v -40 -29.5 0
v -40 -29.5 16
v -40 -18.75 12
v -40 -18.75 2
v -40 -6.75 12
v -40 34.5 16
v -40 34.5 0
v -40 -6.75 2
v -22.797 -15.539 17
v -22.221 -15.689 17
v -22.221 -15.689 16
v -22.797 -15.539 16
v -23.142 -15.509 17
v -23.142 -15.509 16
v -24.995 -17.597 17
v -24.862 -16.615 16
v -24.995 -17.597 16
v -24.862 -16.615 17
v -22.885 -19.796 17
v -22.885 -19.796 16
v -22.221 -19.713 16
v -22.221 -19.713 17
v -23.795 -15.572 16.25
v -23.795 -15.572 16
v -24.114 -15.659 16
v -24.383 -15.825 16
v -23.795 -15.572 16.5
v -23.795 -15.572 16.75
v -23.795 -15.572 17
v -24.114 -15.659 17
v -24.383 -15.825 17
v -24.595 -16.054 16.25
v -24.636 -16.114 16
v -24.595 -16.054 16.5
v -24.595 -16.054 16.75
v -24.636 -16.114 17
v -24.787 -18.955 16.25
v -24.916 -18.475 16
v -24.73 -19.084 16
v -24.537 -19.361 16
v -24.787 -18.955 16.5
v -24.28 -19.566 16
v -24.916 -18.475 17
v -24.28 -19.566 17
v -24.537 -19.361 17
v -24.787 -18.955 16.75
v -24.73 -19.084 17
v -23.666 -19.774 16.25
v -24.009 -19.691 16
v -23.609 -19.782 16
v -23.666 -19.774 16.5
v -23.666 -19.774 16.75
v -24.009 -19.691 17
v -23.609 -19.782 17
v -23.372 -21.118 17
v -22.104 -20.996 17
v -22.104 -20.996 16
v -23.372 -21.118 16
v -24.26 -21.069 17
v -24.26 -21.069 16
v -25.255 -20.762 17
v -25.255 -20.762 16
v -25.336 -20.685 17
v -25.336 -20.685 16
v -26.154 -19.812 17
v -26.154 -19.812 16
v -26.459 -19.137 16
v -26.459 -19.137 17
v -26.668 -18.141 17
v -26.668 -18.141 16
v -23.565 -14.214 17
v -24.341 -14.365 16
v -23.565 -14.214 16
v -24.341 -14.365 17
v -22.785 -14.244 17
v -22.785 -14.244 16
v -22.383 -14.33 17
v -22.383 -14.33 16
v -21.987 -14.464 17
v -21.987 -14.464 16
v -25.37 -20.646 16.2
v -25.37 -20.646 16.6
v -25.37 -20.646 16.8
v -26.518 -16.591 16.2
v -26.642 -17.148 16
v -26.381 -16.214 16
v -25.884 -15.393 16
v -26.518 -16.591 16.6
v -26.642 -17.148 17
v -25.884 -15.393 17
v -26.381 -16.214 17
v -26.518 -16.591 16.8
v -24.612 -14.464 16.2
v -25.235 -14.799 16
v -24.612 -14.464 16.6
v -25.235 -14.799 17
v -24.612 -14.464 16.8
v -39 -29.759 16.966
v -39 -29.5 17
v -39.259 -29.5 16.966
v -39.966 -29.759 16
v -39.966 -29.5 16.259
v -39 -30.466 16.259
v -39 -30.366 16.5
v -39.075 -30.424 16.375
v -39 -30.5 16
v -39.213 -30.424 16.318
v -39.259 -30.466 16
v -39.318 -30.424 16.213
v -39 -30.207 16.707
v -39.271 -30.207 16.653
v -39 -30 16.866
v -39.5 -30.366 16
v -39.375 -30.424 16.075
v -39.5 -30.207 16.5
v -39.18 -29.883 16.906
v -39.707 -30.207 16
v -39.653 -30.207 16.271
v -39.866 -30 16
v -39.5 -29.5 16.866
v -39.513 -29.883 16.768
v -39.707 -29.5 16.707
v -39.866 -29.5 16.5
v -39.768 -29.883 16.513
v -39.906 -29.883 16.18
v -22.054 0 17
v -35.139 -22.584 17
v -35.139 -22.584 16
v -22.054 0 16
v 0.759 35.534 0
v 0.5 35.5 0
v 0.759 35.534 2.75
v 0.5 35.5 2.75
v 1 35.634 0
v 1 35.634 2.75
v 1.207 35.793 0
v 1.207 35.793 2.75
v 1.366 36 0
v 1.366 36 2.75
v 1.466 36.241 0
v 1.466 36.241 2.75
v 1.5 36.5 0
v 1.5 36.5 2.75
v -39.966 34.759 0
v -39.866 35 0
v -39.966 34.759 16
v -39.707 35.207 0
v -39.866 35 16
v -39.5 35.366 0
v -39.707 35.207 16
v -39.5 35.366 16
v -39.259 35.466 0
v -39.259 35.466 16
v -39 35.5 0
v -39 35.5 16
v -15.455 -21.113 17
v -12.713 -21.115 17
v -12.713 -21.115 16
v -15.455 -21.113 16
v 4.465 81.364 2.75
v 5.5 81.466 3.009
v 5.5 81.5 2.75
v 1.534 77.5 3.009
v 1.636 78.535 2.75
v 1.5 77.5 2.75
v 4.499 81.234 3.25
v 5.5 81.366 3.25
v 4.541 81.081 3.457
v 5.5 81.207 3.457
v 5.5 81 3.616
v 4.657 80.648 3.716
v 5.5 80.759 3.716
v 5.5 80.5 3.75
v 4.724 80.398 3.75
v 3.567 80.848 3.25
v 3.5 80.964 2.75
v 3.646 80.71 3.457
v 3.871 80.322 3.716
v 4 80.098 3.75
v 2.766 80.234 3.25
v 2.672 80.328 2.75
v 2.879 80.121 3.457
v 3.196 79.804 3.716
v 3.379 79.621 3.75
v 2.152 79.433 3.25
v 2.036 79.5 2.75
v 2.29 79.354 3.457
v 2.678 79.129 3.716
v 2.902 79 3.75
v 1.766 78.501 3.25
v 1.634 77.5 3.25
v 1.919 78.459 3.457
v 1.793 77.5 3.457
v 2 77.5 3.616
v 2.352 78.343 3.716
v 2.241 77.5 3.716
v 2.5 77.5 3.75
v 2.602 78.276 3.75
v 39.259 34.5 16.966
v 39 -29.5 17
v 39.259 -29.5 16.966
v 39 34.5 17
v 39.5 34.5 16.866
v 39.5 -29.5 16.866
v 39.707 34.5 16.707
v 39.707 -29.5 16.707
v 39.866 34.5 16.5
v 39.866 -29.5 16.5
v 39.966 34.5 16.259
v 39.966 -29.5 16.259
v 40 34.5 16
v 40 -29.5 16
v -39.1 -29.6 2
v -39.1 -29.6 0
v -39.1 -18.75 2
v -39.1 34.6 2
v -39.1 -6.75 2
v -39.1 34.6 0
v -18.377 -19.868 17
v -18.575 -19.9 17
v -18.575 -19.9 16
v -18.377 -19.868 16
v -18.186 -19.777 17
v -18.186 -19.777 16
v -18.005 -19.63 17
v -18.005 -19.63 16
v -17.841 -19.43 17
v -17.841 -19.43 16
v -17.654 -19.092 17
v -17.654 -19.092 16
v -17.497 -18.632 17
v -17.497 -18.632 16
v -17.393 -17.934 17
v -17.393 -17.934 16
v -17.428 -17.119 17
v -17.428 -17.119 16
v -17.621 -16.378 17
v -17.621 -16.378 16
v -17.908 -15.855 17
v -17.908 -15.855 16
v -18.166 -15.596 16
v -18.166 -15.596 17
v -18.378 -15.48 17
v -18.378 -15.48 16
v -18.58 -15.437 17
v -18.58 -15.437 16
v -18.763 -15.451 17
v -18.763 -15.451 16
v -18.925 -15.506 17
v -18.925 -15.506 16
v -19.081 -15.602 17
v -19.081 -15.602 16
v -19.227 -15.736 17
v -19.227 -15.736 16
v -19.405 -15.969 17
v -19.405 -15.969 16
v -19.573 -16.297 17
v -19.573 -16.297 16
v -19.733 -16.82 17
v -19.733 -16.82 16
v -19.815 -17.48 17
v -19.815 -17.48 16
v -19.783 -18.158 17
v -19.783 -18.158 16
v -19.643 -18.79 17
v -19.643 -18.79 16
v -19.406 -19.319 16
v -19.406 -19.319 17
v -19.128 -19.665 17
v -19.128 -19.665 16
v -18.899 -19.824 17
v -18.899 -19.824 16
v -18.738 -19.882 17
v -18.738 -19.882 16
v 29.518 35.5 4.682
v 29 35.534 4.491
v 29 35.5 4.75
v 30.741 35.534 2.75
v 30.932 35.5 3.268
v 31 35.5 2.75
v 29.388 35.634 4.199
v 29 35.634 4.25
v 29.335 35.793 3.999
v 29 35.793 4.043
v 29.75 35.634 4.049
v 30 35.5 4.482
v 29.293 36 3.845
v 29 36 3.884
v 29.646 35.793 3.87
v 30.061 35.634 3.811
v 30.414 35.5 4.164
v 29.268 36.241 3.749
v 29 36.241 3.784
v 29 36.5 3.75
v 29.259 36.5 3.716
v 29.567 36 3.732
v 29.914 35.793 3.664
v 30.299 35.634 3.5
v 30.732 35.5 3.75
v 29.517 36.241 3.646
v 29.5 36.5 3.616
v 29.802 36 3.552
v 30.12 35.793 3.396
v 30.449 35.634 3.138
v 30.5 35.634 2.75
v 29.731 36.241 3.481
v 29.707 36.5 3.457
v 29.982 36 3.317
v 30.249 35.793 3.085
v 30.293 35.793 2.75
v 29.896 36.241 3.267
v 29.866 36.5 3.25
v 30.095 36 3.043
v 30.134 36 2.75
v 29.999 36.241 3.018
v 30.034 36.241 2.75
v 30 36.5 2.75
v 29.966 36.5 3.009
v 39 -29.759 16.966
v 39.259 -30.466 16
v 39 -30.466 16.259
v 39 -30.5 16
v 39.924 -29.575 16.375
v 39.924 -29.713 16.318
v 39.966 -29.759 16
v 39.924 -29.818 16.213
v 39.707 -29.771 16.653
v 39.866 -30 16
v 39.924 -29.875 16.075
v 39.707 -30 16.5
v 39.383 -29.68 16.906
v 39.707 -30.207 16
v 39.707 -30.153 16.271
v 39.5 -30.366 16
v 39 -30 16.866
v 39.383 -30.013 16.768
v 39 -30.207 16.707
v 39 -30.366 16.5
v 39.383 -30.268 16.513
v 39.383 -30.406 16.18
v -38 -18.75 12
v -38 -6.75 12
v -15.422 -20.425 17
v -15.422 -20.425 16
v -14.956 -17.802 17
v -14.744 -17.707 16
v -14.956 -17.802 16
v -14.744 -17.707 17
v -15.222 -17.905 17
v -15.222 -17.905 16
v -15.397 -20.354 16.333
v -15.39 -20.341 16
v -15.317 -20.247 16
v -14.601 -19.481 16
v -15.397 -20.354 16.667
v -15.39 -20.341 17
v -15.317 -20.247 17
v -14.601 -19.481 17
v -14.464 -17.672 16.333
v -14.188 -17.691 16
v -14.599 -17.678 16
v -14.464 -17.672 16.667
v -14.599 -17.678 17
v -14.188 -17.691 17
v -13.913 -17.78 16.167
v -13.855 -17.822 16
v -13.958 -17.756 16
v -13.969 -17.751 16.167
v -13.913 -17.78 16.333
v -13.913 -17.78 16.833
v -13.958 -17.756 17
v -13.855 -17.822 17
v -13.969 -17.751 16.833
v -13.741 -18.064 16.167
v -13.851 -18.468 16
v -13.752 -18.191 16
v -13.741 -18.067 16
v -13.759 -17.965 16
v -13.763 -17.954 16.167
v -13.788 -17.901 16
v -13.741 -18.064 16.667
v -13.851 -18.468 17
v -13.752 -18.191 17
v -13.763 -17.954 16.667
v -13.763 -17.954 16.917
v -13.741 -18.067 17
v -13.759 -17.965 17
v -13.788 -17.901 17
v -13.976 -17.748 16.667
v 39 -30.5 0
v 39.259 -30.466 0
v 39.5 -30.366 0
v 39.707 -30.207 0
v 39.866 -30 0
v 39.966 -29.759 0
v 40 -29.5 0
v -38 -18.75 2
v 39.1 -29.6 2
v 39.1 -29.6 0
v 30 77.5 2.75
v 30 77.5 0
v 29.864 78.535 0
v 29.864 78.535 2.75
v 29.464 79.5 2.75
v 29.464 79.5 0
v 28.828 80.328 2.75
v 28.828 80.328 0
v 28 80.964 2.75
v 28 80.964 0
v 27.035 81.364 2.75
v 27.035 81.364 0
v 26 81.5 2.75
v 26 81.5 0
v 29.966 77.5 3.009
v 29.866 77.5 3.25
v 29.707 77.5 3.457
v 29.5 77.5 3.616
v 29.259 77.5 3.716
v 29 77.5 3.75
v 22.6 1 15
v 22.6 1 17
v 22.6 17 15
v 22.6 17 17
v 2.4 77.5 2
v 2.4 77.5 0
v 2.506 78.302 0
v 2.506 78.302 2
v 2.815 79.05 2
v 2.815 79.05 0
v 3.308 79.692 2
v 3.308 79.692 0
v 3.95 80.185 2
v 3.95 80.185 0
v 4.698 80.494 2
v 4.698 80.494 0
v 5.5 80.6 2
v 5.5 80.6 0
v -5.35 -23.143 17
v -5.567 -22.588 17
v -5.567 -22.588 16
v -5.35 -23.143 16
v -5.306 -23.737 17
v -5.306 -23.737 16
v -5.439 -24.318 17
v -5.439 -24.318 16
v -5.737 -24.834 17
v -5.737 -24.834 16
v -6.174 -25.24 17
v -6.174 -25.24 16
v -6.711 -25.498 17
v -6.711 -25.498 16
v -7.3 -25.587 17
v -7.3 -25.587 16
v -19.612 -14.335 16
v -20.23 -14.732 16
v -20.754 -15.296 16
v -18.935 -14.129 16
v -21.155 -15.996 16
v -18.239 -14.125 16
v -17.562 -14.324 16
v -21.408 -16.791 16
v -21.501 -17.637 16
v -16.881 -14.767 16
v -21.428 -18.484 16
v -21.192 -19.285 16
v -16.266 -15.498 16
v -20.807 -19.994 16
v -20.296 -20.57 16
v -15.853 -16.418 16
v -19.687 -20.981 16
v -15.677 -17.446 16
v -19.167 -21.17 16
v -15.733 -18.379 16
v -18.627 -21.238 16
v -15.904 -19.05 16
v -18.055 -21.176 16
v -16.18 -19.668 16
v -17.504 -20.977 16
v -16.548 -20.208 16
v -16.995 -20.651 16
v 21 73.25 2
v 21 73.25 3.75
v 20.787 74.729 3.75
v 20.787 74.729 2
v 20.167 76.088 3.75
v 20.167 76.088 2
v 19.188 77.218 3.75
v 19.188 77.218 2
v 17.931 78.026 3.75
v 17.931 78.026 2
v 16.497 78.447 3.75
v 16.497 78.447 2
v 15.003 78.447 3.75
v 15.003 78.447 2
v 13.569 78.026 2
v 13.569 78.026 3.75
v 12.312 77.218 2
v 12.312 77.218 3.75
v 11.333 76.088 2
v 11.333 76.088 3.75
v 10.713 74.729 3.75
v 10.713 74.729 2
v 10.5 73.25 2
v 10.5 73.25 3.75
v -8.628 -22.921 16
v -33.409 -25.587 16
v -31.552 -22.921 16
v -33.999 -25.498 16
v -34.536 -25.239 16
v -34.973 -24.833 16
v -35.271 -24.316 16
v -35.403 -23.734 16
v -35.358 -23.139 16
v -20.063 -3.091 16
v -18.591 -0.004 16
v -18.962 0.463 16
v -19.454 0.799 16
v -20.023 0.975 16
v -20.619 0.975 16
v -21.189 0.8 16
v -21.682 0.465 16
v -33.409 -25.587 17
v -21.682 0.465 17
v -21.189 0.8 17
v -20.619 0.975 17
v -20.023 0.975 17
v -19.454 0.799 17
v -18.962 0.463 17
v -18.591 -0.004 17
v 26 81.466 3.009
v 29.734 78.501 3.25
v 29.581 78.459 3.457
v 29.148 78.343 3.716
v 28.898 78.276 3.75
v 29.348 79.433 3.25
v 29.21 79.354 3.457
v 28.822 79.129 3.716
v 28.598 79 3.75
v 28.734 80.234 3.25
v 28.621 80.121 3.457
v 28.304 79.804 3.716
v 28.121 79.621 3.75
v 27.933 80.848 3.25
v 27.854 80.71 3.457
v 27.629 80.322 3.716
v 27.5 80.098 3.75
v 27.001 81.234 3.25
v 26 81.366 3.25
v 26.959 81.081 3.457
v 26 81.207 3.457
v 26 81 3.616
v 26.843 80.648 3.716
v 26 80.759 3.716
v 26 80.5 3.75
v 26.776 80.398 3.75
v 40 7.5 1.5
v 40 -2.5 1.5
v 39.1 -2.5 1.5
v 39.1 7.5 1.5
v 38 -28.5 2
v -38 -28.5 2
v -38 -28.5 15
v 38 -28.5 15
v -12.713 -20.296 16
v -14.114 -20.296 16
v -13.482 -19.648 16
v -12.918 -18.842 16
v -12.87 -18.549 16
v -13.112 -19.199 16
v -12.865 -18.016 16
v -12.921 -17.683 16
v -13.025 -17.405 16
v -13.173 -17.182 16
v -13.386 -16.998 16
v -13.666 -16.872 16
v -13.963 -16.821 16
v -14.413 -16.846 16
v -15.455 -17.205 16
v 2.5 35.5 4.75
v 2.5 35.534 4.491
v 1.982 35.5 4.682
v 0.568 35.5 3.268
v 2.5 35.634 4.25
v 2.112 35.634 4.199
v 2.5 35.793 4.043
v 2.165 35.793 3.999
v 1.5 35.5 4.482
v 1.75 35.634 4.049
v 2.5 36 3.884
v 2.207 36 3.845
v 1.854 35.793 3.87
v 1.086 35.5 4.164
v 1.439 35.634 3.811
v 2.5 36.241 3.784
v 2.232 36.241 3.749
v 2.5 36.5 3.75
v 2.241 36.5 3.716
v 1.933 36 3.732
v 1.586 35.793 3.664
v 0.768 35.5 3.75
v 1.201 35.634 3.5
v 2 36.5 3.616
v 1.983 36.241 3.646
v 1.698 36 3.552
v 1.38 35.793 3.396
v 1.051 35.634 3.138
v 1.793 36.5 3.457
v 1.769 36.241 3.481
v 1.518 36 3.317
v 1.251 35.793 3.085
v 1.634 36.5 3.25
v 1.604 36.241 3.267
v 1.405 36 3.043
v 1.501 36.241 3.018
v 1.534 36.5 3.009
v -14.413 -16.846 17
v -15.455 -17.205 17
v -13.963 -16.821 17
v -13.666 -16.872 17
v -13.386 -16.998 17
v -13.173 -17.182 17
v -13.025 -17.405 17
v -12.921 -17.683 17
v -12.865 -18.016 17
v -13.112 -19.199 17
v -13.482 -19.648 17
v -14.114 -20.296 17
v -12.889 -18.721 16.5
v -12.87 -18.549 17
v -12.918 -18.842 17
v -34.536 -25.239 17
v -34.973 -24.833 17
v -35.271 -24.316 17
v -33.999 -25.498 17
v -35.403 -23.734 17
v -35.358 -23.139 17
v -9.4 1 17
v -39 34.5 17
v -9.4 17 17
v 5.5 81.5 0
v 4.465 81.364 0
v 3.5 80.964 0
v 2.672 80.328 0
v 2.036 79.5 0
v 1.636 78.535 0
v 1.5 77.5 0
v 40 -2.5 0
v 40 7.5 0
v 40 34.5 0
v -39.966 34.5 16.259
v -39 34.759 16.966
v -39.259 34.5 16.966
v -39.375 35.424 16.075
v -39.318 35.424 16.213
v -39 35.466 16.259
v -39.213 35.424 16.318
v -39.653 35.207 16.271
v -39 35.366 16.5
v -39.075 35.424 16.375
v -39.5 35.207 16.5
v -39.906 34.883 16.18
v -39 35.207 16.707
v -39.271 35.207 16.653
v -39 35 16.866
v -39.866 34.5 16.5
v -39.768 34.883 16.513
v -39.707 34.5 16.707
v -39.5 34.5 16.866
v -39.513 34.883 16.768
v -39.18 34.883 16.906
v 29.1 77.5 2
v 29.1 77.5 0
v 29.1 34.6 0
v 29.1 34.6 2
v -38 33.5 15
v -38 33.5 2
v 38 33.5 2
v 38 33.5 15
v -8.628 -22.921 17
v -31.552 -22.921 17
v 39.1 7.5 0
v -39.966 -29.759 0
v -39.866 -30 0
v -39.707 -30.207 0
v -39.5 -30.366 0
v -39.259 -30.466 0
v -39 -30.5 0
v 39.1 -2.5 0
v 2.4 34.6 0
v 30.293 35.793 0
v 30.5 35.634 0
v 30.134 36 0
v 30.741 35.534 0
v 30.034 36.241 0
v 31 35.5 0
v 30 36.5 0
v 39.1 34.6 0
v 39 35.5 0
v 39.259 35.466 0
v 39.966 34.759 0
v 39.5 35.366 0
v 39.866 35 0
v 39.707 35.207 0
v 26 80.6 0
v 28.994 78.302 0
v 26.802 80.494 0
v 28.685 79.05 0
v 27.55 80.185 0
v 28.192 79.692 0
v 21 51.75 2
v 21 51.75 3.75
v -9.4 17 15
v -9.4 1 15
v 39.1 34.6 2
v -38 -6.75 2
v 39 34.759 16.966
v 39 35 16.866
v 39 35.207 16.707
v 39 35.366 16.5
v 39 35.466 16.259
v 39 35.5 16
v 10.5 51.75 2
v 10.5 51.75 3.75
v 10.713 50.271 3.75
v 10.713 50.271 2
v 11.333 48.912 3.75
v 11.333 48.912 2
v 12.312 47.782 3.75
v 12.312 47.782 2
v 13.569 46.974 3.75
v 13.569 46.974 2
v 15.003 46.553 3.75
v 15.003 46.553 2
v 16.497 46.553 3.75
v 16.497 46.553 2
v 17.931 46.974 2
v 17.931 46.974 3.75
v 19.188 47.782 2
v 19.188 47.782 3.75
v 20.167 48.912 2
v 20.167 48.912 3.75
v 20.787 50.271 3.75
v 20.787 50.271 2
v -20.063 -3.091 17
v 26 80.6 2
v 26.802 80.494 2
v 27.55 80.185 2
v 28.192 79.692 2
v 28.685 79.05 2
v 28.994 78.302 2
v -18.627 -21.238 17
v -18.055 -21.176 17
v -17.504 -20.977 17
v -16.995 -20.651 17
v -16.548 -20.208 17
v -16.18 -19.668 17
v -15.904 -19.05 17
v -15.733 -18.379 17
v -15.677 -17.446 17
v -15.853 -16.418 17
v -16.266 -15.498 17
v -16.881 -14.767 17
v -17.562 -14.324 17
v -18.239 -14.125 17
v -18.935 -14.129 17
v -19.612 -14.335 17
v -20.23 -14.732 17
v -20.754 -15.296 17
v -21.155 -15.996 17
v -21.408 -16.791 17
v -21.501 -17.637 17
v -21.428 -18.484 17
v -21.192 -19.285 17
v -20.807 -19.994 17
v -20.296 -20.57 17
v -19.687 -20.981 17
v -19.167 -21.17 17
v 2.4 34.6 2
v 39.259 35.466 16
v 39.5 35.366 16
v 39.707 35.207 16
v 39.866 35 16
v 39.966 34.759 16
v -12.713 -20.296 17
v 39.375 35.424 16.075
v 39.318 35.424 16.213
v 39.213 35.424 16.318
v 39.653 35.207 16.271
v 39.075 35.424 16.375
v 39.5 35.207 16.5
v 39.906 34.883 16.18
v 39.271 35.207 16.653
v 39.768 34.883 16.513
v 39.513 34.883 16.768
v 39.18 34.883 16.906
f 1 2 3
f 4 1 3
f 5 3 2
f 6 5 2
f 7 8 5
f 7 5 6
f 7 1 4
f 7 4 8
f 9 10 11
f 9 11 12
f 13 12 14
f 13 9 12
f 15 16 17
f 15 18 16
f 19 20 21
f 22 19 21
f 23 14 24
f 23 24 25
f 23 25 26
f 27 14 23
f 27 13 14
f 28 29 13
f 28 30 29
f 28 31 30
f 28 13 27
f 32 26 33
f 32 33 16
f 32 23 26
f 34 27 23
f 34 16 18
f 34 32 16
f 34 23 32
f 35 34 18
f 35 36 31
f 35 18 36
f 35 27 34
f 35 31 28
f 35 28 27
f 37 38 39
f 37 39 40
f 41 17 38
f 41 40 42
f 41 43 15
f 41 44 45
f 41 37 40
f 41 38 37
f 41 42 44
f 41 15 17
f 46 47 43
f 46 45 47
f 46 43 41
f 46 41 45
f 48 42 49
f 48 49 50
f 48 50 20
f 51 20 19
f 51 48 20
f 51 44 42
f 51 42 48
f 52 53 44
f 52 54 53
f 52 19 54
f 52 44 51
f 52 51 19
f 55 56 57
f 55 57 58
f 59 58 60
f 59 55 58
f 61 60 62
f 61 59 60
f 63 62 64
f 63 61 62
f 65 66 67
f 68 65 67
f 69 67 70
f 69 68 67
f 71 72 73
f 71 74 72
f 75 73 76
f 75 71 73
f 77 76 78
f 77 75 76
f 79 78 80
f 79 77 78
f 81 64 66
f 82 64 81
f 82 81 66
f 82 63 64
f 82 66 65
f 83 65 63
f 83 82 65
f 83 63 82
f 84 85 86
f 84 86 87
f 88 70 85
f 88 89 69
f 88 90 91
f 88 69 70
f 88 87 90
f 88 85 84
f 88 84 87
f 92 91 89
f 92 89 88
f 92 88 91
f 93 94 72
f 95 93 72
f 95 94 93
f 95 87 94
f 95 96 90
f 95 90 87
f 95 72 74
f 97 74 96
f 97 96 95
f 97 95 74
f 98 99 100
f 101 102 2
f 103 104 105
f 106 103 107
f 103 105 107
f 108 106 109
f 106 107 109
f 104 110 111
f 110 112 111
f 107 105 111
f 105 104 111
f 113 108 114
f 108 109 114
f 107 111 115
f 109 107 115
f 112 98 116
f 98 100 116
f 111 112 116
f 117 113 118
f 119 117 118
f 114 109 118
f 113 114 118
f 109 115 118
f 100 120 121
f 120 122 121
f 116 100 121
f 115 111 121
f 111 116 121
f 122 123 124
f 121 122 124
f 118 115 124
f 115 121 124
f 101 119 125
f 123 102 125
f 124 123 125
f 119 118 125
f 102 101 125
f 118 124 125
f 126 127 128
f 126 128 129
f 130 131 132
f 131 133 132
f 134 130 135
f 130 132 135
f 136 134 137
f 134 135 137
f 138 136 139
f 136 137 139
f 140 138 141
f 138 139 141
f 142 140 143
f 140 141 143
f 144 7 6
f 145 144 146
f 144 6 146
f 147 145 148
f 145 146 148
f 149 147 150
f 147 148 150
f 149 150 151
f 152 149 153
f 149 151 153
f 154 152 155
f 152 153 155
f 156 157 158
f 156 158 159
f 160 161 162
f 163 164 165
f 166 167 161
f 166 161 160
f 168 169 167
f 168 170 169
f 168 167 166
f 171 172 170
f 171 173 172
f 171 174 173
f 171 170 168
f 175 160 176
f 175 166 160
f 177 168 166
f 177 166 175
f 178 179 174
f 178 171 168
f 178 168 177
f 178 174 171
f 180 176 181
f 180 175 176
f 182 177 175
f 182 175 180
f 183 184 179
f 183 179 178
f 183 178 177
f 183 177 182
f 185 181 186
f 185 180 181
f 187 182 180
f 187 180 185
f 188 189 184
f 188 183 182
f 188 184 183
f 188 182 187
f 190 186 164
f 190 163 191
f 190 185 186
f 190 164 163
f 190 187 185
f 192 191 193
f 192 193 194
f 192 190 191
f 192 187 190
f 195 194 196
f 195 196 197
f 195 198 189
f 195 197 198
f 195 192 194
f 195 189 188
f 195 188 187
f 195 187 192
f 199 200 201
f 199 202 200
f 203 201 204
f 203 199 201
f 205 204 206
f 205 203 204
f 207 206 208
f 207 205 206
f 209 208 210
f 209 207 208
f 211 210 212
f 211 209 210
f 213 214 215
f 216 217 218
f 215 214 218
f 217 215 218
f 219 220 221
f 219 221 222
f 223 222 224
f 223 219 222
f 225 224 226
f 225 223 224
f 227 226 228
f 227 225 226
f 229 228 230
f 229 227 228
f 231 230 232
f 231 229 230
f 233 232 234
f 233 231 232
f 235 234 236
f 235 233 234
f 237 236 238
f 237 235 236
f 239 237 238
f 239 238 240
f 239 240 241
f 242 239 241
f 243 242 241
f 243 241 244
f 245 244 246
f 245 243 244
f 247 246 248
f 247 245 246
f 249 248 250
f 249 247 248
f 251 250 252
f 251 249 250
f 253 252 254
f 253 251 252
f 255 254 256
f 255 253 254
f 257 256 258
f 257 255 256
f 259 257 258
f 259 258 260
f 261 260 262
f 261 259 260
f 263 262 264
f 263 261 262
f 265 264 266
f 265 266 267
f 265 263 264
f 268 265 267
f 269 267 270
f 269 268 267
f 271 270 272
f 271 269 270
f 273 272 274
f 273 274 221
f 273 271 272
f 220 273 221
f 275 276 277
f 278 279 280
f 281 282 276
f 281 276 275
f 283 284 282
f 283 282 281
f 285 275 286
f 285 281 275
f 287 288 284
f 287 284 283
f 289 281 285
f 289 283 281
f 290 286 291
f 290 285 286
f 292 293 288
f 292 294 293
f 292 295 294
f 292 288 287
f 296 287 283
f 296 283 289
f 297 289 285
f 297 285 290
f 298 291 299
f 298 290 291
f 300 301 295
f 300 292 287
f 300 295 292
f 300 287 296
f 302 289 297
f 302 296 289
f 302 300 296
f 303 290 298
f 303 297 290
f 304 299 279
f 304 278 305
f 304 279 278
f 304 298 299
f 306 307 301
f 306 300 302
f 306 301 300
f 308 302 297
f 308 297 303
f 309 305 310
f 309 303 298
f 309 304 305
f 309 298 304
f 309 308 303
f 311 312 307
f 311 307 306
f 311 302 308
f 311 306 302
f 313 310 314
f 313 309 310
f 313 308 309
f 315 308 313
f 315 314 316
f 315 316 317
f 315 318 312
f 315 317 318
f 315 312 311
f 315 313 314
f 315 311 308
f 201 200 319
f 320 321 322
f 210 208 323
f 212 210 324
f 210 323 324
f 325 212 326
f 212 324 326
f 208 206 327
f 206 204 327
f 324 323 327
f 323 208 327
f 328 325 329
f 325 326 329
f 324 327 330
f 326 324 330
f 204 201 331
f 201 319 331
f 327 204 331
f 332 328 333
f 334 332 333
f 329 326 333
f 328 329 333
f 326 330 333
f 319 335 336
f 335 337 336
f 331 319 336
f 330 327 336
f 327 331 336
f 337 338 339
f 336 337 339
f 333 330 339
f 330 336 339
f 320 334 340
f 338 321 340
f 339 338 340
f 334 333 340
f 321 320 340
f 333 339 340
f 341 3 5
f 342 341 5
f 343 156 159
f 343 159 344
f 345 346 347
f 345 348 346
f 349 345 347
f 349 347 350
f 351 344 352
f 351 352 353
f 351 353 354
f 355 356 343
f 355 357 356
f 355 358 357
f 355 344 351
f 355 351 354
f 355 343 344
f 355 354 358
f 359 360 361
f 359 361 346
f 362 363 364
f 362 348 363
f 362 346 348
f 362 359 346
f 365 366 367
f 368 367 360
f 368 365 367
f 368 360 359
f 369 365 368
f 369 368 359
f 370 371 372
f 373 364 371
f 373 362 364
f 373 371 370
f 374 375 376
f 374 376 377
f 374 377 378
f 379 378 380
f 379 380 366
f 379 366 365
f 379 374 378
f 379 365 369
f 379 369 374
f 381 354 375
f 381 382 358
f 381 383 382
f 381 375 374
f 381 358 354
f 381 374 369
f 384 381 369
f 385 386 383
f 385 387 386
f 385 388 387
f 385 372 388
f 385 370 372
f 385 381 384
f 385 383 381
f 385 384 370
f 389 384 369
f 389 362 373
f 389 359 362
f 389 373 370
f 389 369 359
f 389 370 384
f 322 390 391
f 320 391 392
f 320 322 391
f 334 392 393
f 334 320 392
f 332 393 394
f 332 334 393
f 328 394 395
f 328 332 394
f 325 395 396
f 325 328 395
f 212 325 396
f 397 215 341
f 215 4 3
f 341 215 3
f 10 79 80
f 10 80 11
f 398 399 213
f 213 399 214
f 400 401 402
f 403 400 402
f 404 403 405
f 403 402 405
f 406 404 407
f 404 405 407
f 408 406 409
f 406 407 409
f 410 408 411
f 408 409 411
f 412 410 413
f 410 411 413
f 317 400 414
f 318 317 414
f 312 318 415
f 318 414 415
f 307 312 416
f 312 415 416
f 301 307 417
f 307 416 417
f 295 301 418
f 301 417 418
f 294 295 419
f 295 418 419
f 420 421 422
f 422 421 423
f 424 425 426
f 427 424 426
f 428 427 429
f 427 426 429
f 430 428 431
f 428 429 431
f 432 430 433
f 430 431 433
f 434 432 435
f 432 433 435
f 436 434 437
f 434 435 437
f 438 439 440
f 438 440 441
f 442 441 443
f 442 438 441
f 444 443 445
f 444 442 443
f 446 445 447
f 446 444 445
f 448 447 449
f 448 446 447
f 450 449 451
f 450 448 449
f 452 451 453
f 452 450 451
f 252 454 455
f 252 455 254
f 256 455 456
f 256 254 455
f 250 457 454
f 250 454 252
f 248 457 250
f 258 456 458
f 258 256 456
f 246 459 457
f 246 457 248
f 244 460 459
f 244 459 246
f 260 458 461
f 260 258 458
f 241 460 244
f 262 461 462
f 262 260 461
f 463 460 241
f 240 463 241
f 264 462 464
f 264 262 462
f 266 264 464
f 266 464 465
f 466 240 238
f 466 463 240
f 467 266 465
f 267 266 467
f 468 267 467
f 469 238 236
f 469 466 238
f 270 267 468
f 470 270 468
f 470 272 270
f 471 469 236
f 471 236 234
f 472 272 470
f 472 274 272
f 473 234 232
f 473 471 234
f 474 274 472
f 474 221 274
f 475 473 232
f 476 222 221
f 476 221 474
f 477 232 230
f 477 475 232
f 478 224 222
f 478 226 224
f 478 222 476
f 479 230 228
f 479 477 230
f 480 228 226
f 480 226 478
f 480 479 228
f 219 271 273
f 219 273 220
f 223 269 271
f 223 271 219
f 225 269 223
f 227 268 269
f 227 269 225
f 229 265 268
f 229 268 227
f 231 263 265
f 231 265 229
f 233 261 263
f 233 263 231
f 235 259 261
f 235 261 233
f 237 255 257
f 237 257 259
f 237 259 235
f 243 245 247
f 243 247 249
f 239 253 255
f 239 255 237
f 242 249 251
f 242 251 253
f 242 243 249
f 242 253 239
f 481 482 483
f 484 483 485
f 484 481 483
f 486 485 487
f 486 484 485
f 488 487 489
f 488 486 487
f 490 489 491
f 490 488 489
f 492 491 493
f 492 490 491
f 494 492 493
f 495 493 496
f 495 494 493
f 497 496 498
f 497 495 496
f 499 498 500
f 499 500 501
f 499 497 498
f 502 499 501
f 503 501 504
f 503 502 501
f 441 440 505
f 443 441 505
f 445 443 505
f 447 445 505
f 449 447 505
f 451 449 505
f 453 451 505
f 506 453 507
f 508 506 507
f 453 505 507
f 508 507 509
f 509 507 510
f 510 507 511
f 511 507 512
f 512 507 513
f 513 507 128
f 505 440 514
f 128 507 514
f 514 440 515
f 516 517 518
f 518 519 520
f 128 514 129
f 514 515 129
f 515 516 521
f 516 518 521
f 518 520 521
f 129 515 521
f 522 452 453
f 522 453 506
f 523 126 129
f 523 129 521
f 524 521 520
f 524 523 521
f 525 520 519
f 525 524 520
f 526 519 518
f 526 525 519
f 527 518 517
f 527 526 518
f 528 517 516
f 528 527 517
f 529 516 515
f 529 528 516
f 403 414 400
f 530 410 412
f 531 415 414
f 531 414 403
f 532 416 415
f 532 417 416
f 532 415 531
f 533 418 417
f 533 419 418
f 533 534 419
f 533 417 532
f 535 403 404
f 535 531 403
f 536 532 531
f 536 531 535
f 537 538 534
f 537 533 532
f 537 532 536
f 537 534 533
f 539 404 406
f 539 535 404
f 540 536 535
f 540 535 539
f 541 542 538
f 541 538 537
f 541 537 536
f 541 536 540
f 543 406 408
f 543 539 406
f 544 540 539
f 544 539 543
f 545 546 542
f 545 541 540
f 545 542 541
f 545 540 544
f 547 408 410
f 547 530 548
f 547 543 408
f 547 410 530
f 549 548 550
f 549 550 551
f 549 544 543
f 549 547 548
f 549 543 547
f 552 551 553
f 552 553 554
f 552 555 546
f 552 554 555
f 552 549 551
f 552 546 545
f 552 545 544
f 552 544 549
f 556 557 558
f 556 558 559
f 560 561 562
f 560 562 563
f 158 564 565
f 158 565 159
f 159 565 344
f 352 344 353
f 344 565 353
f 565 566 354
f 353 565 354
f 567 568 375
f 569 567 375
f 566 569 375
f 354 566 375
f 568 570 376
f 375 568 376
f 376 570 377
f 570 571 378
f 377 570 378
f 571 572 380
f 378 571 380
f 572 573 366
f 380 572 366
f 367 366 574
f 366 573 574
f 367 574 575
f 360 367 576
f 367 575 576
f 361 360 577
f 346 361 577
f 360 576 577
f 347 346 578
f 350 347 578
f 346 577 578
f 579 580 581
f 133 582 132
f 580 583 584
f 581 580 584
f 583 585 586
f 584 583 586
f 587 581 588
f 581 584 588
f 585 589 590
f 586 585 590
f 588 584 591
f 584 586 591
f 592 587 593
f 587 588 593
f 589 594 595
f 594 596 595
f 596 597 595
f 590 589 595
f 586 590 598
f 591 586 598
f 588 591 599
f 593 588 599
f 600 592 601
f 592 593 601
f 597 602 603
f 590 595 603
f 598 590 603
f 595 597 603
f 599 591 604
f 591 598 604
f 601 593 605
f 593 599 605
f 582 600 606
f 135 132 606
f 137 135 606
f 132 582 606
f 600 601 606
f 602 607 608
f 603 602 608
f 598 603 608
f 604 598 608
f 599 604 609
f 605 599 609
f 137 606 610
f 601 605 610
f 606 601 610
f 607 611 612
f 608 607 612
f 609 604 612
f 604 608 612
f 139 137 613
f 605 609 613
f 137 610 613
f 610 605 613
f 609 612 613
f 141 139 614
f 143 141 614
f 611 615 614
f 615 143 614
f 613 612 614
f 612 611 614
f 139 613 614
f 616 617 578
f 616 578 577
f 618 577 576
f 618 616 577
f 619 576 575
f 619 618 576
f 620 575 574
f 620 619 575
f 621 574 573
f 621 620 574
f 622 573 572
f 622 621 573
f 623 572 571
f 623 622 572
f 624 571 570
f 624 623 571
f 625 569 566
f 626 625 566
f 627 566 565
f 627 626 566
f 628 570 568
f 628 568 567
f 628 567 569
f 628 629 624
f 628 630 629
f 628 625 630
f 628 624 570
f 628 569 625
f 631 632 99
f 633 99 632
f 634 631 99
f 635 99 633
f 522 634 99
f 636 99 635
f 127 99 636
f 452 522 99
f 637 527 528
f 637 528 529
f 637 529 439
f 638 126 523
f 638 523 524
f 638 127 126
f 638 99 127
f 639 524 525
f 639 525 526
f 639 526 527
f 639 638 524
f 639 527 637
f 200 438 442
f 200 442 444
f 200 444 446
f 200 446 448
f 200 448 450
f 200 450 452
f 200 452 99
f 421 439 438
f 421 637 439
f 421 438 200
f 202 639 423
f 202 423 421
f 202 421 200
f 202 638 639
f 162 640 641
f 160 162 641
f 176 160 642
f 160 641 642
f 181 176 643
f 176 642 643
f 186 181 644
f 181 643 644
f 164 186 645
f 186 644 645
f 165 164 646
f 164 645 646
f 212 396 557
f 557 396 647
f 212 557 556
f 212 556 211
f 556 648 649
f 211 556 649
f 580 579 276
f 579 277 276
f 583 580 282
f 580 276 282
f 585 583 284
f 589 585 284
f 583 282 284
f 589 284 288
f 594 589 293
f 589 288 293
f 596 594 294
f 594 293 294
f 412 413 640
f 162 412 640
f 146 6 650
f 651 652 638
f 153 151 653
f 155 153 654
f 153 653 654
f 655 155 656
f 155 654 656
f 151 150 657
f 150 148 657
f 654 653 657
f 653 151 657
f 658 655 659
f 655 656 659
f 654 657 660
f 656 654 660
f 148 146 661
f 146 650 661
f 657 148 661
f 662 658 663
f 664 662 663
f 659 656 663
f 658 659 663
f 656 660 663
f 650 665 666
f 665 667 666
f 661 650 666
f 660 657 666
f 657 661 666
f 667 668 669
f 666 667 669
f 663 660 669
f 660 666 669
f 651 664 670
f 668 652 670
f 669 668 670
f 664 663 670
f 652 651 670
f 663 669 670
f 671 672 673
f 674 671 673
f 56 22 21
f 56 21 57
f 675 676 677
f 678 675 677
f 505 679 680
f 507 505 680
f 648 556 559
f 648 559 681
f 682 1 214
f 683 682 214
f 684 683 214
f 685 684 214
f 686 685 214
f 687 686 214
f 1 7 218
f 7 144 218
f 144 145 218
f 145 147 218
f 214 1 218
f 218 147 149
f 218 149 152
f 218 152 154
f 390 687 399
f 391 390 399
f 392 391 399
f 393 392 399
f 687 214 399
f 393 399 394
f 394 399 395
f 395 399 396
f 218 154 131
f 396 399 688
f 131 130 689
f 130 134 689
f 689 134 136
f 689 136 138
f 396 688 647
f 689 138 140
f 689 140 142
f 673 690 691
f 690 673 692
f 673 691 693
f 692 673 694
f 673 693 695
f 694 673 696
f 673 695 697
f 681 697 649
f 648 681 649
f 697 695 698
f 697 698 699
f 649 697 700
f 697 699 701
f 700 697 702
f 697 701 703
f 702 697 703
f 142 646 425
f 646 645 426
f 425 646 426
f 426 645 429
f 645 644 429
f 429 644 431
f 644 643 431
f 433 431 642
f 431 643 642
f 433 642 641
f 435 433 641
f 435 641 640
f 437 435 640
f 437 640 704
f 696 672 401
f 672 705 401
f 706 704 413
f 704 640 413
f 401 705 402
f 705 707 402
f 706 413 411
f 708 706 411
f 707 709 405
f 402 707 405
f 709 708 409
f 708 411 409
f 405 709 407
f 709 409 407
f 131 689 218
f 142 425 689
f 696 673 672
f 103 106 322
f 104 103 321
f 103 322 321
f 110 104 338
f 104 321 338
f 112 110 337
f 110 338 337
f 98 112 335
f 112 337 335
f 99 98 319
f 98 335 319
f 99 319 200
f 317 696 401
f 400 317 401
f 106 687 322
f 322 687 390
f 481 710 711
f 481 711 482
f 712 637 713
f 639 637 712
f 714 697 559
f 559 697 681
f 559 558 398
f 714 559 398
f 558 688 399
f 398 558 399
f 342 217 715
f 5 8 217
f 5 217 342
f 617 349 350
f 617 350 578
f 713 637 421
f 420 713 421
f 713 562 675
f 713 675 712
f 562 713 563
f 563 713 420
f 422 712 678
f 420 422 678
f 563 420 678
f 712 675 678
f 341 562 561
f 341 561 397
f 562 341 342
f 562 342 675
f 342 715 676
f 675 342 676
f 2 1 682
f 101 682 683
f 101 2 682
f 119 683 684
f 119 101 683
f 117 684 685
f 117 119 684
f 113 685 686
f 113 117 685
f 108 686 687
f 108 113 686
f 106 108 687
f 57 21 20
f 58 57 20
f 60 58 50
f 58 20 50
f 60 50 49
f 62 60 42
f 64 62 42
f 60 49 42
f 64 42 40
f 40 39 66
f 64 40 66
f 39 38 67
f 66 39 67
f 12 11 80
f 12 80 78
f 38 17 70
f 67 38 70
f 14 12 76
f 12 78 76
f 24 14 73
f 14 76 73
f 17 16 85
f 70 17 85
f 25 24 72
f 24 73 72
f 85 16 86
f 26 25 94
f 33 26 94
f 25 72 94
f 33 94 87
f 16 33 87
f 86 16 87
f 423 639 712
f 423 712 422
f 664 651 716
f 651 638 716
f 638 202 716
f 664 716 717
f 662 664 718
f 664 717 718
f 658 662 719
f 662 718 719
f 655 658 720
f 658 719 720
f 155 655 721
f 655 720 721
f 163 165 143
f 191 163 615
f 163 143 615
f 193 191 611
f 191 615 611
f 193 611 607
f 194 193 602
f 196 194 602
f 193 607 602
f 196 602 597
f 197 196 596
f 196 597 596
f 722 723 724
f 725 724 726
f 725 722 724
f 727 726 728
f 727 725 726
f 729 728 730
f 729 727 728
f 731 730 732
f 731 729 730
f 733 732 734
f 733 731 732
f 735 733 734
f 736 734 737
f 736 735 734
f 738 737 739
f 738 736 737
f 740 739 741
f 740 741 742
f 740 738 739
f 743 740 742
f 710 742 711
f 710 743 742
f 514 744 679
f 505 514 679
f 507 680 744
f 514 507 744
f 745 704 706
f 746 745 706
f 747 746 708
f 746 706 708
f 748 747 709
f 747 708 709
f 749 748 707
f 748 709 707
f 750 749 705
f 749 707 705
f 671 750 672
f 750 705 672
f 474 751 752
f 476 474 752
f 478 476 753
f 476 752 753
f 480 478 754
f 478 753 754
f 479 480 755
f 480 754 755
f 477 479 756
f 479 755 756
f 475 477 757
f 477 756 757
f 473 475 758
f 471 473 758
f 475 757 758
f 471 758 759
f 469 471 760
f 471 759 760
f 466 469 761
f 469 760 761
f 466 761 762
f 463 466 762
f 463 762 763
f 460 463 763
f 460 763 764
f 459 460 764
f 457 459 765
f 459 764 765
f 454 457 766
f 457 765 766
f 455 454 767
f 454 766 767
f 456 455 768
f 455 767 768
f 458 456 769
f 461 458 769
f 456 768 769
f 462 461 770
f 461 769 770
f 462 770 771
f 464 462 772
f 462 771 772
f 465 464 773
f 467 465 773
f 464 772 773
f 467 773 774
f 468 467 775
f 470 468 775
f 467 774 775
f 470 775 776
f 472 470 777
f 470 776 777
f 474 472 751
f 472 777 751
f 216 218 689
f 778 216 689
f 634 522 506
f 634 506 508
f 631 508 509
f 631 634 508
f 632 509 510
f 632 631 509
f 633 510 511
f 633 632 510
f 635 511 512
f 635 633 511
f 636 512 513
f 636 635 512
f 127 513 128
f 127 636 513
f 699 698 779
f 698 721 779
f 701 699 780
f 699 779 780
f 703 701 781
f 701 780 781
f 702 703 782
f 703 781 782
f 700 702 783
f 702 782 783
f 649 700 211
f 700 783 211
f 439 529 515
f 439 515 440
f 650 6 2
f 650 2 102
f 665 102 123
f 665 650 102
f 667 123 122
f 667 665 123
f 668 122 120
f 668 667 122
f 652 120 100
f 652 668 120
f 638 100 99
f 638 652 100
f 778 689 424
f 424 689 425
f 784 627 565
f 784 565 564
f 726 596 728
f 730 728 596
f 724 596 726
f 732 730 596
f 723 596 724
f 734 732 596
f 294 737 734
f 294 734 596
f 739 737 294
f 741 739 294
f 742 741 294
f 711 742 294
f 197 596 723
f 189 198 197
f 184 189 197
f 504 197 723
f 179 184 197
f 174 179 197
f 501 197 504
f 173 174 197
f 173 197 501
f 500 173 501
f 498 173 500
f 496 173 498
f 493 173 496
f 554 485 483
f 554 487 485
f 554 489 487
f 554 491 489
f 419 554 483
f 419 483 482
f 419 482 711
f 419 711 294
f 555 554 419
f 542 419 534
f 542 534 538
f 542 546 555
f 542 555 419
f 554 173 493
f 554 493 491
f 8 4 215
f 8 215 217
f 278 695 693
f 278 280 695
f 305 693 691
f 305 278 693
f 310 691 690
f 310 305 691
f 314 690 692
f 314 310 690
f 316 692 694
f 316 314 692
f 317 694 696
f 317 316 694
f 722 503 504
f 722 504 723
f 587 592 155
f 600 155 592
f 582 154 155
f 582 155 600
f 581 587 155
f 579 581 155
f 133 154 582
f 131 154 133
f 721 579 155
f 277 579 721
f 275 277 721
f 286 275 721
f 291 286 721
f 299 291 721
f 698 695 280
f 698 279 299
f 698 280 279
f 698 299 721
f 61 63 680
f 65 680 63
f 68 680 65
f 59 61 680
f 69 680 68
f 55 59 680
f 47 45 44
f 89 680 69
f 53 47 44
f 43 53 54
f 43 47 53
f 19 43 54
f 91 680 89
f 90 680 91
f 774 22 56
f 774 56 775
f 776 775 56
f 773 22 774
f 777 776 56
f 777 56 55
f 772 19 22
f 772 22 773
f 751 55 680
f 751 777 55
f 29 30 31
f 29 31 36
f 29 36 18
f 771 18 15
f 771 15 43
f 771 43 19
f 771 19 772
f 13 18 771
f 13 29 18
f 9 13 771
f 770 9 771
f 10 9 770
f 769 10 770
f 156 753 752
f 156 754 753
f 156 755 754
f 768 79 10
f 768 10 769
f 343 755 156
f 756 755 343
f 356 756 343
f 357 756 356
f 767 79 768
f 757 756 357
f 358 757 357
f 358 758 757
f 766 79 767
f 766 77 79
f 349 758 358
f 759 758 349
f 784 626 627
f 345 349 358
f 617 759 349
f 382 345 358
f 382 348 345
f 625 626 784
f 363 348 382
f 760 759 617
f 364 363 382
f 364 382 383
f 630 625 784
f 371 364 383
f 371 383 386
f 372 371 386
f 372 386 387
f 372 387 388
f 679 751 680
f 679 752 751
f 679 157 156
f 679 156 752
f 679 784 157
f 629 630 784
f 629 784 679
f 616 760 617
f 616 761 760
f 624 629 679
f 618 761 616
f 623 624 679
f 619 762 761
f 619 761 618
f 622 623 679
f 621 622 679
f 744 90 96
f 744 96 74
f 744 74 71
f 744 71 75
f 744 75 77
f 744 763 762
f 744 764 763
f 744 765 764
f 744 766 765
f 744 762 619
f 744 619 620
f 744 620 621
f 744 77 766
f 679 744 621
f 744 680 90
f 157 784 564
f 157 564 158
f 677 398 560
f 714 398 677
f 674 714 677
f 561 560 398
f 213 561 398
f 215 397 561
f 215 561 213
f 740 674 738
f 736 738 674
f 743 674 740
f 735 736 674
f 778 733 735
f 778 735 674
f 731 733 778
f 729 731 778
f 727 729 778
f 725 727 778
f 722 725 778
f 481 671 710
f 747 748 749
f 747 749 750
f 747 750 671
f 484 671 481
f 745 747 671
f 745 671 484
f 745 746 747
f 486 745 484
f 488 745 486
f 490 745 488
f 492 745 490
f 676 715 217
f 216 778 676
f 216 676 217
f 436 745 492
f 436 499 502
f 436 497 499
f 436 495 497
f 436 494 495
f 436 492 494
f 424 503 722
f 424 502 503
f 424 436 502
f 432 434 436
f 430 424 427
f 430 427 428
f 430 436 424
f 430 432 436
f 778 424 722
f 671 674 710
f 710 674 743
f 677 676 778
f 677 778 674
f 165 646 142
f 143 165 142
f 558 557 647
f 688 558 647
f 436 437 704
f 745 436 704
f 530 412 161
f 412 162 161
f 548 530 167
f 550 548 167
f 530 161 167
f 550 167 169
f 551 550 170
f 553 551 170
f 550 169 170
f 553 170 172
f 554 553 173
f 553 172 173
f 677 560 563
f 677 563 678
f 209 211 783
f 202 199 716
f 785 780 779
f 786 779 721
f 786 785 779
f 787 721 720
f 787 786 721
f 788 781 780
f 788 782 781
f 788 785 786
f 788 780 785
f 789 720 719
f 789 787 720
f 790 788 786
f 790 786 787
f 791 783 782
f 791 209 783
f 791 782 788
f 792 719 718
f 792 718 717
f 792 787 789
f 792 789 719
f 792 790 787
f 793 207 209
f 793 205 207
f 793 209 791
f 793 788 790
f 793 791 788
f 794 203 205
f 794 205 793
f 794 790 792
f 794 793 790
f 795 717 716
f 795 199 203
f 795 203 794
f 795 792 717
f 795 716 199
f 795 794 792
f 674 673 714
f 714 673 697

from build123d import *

# Parameters (mm, degrees)
CROQUIS1_W              = 80
CROQUIS1_H              = 66
SALIENTE_EXTRUIR2_DEPTH = 17
VACIADO7_T              = -2
CORTAR_EXTRUIR9_REACH   = 58.118
CROQUIS12_W             = 32
CROQUIS12_H             = 16
SALIENTE_EXTRUIR3_DEPTH = 3.75
CORTAR_EXTRUIR11_DEPTH  = 2
CORTAR_EXTRUIR26_REACH  = 117.461
CROQUIS16_W             = 10
CROQUIS16_H             = 12
CROQUIS20_RX            = 3.568577335
CROQUIS20_RY            = 2.914426882
CROQUIS20_RX_2          = 2.232634343
CROQUIS20_RY_2          = 1.215365865
CORTAR_EXTRUIR24_DEPTH  = 1
CORTAR_EXTRUIR25_REACH  = 117.461
CROQUIS27_W             = 1.5
CROQUIS27_H             = 10
REDONDEO3_R             = 1


with BuildPart() as part:
    # Croquis1 → Saliente-Extruir2 (new body)
    with BuildSketch(Plane.XY):
        with Locations((0, 2.5)):
            Rectangle(CROQUIS1_W, CROQUIS1_H)
    extrude(amount=SALIENTE_EXTRUIR2_DEPTH)

    # Vaciado7
    vaciado7_openings = [part.faces().sort_by_distance(p)[0] for p in [
        (0, 2.5, 0),
    ]]
    offset(amount=VACIADO7_T, openings=vaciado7_openings, kind=Kind.INTERSECTION)

    # Croquis12 → Cortar-Extruir9 (cut, up to next)
    with BuildSketch(Plane.XY.offset(17), mode=Mode.PRIVATE) as cortar_extruir9_sk1:
        with Locations((6.6, 9)):
            Rectangle(CROQUIS12_W, CROQUIS12_H)
    cortar_extruir9_tool1 = extrude(cortar_extruir9_sk1.sketch, amount=-CORTAR_EXTRUIR9_REACH, mode=Mode.PRIVATE) & part.part
    add(cortar_extruir9_tool1.solids().sort_by_distance((6.6, 9, 17))[0], mode=Mode.SUBTRACT)

    # Croquis29 → Saliente-Extruir3 (add)
    with BuildSketch(Plane(origin=(0, 0, 0), x_dir=(-1, 0, 0), z_dir=(0, 0, -1))):
        with BuildLine():
            Line((-1.5, 77.5), (-1.5, 35.5))
            Line((-1.5, 35.5), (-30, 35.5))
            Line((-30, 35.5), (-30, 77.5))
            ThreePointArc((-30, 77.5), (-28.828427125, 80.328427125), (-26, 81.5))
            Line((-26, 81.5), (-5.5, 81.5))
            ThreePointArc((-5.5, 81.5), (-2.671572875, 80.328427125), (-1.5, 77.5))
        make_face()
        with BuildLine():
            Line((-10.5, 73.25), (-10.5, 51.75))
            ThreePointArc((-10.5, 51.75), (-15.75, 46.5), (-21, 51.75))
            Line((-21, 51.75), (-21, 73.25))
            ThreePointArc((-21, 73.25), (-15.75, 78.5), (-10.5, 73.25))
        make_face(mode=Mode.SUBTRACT)
    extrude(amount=-SALIENTE_EXTRUIR3_DEPTH)

    # Croquis14 → Cortar-Extruir11 (cut)
    with BuildSketch(Plane(origin=(0, 0, 0), x_dir=(-1, 0, 0), z_dir=(0, 0, -1))):
        with BuildLine():
            Line((39.1, 34.6), (-2.4, 34.6))
            Line((-2.4, 34.6), (-2.4, 77.5))
            ThreePointArc((-2.4, 77.5), (-3.307968978, 79.692031022), (-5.5, 80.6))
            Line((-5.5, 80.6), (-26, 80.6))
            ThreePointArc((-26, 80.6), (-28.192031022, 79.692031022), (-29.1, 77.5))
            Line((-29.1, 77.5), (-29.1, 34.6))
            Line((-29.1, 34.6), (-39.1, 34.6))
            Line((-39.1, 34.6), (-39.1, -29.6))
            Line((-39.1, -29.6), (39.1, -29.6))
            Line((39.1, -29.6), (39.1, 34.6))
        make_face()
    extrude(amount=-CORTAR_EXTRUIR11_DEPTH, mode=Mode.SUBTRACT)

    # Croquis16 → Cortar-Extruir26 (cut, up to next)
    with BuildSketch(Plane.ZY.offset(40), mode=Mode.PRIVATE) as cortar_extruir26_sk1:
        with Locations((7, -12.75)):
            Rectangle(CROQUIS16_W, CROQUIS16_H)
    cortar_extruir26_tool1 = extrude(cortar_extruir26_sk1.sketch, amount=-CORTAR_EXTRUIR26_REACH, mode=Mode.PRIVATE) & part.part
    add(cortar_extruir26_tool1.solids().sort_by_distance((-40, -12.75, 7))[0], mode=Mode.SUBTRACT)

    # Croquis20 → Cortar-Extruir24 (cut)
    # profile 1 of 4: a face of its own
    with BuildSketch(Plane.XY.offset(17)):
        with BuildLine():
            Line((-18.590755698, -0.003579358), (-5.567484693, -22.587785135))
            ThreePointArc((-5.567484693, -22.587785135), (-5.568268134, -24.587332542), (-7.300057676, -25.586880154))
            Line((-7.300057676, -25.586880154), (-33.408883205, -25.586880154))
            ThreePointArc((-33.408883205, -25.586880154), (-35.141705867, -24.58554207), (-35.139387206, -22.584205777))
            Line((-35.139387206, -22.584205777), (-22.053832682, 0))
            ThreePointArc((-22.053832682, 0), (-20.321261528, 0.997324555), (-18.590755698, -0.003579358))
        make_face()
        Polygon((-8.62777783, -22.920674051), (-31.552205736, -22.920674051), (-20.06264827, -3.090980963), align=None, mode=Mode.SUBTRACT)
    # profile 2 of 4: a face of its own
    with BuildSketch(Plane.XY.offset(17)):
        with BuildLine():
            add(Edge.make_bspline(
                [(-22.220585459, -15.688668337), (-22.473316841, -15.63034571), (-22.720114648, -15.532860824), (-22.978779606, -15.513700456), (-23.250899762, -15.493543408), (-23.524824294, -15.535960138), (-23.795296381, -15.572023083), (-25.212214439, -15.760945491), (-25.122584621, -18.059259203), (-24.786781035, -18.954735434), (-24.397757557, -19.992131374), (-23.042460631, -19.849908777), (-22.220585459, -19.712929581)],
                knots=[0, 0, 0, 0, 1, 1, 1, 2, 2, 2, 3, 3, 3, 4, 4, 4, 4], degree=3))
            Line((-22.220585459, -19.712929581), (-22.103940205, -20.996027369))
            add(Edge.make_bspline(
                [(-22.103940205, -20.996027369), (-23.28060818, -21.143110866), (-24.188386831, -21.254263886), (-25.253362049, -20.762736862), (-25.303288102, -20.739694069), (-25.331125551, -20.68497336), (-25.370007302, -20.646091609), (-25.753754737, -20.262344174), (-26.08625723, -20.026013927), (-26.30316933, -19.537961701), (-27.149632898, -17.633418674), (-26.592646966, -15.27423428), (-24.611813155, -14.463893175), (-23.752583307, -14.112390056), (-22.840530525, -14.122598946), (-21.987294952, -14.463893175)],
                knots=[0, 0, 0, 0, 1, 1, 1, 2, 2, 2, 3, 3, 3, 4, 4, 4, 5, 5, 5, 5], degree=3))
            Line((-21.987294952, -14.463893175), (-22.220585459, -15.688668337))
        make_face()
    # profile 3 of 4: a face of its own
    with BuildSketch(Plane.XY.offset(17)):
        with Locations(Location((-18.587049995, -17.670107047), (0, 0, -90.640192277))):
            Ellipse(CROQUIS20_RX, CROQUIS20_RY)
        with Locations(Location((-18.601854743, -17.667818984), (0, 0, -89.299840613))):
            Ellipse(CROQUIS20_RX_2, CROQUIS20_RY_2, mode=Mode.SUBTRACT)
    # profile 4 of 4: a face of its own
    with BuildSketch(Plane.XY.offset(17)):
        with BuildLine():
            add(Edge.make_bspline(
                [(-15.455160758, -21.112672623), (-15.435719882, -20.85994124), (-15.496688009, -20.587461524), (-15.396838131, -20.354478475), (-15.283211235, -20.089349051), (-12.445503229, -17.671637646), (-14.463676103, -17.671637646), (-14.869932367, -17.671637646), (-14.884905464, -17.820686956), (-15.221870251, -17.904928152)],
                knots=[0, 0, 0, 0, 1, 1, 1, 2, 2, 2, 3, 3, 3, 3], degree=3))
            Line((-15.221870251, -17.904928152), (-15.455160758, -17.205056632))
            add(Edge.make_bspline(
                [(-15.455160758, -17.205056632), (-13.86644657, -16.410699538), (-12.632559042, -16.798398876), (-12.888965182, -18.721444927), (-12.955583326, -19.221081006), (-13.831530636, -19.988290714), (-14.113740343, -20.296155848)],
                knots=[0, 0, 0, 0, 1, 1, 1, 2, 2, 2, 2], degree=3))
            Line((-14.113740343, -20.296155848), (-12.712782774, -20.296155848))
            Line((-12.712782774, -20.296155848), (-12.712782774, -21.114840351))
            Line((-12.712782774, -21.114840351), (-15.455160758, -21.112672623))
        make_face()
    extrude(amount=-CORTAR_EXTRUIR24_DEPTH, mode=Mode.SUBTRACT)

    # Croquis27 → Cortar-Extruir25 (cut, up to next)
    with BuildSketch(Plane(origin=(40, 0, 0), x_dir=(0, 0, -1), z_dir=(1, 0, 0)), mode=Mode.PRIVATE) as cortar_extruir25_sk1:
        with Locations((-0.75, 2.5)):
            Rectangle(CROQUIS27_W, CROQUIS27_H)
    cortar_extruir25_tool1 = extrude(cortar_extruir25_sk1.sketch, amount=-CORTAR_EXTRUIR25_REACH, mode=Mode.PRIVATE) & part.part
    add(cortar_extruir25_tool1.solids().sort_by_distance((40, 2.5, 0.75))[0], mode=Mode.SUBTRACT)

    # Redondeo3
    redondeo3_edges = [part.edges().sort_by_distance(p)[0] for p in [
        (-40, 2.5, 17),
        (0, -30.5, 17),
        (28.828427125, 80.328427125, 3.75),
        (15.75, 81.5, 3.75),
        (2.671572875, 80.328427125, 3.75),
        (1.5, 56.5, 3.75),
        (15.75, 35.5, 3.75),
        (1.5, 35.5, 1.875),
        (30, 56.5, 3.75),
        (30, 35.5, 1.875),
        (40, 2.5, 17),
        (40, -30.5, 8.5),
        (-40, -30.5, 8.5),
        (-40, 35.5, 8.5),
        (40, 35.5, 8.5),
        (0, 35.5, 17),
    ]]
    fillet(redondeo3_edges, radius=REDONDEO3_R)


solid = part.part
